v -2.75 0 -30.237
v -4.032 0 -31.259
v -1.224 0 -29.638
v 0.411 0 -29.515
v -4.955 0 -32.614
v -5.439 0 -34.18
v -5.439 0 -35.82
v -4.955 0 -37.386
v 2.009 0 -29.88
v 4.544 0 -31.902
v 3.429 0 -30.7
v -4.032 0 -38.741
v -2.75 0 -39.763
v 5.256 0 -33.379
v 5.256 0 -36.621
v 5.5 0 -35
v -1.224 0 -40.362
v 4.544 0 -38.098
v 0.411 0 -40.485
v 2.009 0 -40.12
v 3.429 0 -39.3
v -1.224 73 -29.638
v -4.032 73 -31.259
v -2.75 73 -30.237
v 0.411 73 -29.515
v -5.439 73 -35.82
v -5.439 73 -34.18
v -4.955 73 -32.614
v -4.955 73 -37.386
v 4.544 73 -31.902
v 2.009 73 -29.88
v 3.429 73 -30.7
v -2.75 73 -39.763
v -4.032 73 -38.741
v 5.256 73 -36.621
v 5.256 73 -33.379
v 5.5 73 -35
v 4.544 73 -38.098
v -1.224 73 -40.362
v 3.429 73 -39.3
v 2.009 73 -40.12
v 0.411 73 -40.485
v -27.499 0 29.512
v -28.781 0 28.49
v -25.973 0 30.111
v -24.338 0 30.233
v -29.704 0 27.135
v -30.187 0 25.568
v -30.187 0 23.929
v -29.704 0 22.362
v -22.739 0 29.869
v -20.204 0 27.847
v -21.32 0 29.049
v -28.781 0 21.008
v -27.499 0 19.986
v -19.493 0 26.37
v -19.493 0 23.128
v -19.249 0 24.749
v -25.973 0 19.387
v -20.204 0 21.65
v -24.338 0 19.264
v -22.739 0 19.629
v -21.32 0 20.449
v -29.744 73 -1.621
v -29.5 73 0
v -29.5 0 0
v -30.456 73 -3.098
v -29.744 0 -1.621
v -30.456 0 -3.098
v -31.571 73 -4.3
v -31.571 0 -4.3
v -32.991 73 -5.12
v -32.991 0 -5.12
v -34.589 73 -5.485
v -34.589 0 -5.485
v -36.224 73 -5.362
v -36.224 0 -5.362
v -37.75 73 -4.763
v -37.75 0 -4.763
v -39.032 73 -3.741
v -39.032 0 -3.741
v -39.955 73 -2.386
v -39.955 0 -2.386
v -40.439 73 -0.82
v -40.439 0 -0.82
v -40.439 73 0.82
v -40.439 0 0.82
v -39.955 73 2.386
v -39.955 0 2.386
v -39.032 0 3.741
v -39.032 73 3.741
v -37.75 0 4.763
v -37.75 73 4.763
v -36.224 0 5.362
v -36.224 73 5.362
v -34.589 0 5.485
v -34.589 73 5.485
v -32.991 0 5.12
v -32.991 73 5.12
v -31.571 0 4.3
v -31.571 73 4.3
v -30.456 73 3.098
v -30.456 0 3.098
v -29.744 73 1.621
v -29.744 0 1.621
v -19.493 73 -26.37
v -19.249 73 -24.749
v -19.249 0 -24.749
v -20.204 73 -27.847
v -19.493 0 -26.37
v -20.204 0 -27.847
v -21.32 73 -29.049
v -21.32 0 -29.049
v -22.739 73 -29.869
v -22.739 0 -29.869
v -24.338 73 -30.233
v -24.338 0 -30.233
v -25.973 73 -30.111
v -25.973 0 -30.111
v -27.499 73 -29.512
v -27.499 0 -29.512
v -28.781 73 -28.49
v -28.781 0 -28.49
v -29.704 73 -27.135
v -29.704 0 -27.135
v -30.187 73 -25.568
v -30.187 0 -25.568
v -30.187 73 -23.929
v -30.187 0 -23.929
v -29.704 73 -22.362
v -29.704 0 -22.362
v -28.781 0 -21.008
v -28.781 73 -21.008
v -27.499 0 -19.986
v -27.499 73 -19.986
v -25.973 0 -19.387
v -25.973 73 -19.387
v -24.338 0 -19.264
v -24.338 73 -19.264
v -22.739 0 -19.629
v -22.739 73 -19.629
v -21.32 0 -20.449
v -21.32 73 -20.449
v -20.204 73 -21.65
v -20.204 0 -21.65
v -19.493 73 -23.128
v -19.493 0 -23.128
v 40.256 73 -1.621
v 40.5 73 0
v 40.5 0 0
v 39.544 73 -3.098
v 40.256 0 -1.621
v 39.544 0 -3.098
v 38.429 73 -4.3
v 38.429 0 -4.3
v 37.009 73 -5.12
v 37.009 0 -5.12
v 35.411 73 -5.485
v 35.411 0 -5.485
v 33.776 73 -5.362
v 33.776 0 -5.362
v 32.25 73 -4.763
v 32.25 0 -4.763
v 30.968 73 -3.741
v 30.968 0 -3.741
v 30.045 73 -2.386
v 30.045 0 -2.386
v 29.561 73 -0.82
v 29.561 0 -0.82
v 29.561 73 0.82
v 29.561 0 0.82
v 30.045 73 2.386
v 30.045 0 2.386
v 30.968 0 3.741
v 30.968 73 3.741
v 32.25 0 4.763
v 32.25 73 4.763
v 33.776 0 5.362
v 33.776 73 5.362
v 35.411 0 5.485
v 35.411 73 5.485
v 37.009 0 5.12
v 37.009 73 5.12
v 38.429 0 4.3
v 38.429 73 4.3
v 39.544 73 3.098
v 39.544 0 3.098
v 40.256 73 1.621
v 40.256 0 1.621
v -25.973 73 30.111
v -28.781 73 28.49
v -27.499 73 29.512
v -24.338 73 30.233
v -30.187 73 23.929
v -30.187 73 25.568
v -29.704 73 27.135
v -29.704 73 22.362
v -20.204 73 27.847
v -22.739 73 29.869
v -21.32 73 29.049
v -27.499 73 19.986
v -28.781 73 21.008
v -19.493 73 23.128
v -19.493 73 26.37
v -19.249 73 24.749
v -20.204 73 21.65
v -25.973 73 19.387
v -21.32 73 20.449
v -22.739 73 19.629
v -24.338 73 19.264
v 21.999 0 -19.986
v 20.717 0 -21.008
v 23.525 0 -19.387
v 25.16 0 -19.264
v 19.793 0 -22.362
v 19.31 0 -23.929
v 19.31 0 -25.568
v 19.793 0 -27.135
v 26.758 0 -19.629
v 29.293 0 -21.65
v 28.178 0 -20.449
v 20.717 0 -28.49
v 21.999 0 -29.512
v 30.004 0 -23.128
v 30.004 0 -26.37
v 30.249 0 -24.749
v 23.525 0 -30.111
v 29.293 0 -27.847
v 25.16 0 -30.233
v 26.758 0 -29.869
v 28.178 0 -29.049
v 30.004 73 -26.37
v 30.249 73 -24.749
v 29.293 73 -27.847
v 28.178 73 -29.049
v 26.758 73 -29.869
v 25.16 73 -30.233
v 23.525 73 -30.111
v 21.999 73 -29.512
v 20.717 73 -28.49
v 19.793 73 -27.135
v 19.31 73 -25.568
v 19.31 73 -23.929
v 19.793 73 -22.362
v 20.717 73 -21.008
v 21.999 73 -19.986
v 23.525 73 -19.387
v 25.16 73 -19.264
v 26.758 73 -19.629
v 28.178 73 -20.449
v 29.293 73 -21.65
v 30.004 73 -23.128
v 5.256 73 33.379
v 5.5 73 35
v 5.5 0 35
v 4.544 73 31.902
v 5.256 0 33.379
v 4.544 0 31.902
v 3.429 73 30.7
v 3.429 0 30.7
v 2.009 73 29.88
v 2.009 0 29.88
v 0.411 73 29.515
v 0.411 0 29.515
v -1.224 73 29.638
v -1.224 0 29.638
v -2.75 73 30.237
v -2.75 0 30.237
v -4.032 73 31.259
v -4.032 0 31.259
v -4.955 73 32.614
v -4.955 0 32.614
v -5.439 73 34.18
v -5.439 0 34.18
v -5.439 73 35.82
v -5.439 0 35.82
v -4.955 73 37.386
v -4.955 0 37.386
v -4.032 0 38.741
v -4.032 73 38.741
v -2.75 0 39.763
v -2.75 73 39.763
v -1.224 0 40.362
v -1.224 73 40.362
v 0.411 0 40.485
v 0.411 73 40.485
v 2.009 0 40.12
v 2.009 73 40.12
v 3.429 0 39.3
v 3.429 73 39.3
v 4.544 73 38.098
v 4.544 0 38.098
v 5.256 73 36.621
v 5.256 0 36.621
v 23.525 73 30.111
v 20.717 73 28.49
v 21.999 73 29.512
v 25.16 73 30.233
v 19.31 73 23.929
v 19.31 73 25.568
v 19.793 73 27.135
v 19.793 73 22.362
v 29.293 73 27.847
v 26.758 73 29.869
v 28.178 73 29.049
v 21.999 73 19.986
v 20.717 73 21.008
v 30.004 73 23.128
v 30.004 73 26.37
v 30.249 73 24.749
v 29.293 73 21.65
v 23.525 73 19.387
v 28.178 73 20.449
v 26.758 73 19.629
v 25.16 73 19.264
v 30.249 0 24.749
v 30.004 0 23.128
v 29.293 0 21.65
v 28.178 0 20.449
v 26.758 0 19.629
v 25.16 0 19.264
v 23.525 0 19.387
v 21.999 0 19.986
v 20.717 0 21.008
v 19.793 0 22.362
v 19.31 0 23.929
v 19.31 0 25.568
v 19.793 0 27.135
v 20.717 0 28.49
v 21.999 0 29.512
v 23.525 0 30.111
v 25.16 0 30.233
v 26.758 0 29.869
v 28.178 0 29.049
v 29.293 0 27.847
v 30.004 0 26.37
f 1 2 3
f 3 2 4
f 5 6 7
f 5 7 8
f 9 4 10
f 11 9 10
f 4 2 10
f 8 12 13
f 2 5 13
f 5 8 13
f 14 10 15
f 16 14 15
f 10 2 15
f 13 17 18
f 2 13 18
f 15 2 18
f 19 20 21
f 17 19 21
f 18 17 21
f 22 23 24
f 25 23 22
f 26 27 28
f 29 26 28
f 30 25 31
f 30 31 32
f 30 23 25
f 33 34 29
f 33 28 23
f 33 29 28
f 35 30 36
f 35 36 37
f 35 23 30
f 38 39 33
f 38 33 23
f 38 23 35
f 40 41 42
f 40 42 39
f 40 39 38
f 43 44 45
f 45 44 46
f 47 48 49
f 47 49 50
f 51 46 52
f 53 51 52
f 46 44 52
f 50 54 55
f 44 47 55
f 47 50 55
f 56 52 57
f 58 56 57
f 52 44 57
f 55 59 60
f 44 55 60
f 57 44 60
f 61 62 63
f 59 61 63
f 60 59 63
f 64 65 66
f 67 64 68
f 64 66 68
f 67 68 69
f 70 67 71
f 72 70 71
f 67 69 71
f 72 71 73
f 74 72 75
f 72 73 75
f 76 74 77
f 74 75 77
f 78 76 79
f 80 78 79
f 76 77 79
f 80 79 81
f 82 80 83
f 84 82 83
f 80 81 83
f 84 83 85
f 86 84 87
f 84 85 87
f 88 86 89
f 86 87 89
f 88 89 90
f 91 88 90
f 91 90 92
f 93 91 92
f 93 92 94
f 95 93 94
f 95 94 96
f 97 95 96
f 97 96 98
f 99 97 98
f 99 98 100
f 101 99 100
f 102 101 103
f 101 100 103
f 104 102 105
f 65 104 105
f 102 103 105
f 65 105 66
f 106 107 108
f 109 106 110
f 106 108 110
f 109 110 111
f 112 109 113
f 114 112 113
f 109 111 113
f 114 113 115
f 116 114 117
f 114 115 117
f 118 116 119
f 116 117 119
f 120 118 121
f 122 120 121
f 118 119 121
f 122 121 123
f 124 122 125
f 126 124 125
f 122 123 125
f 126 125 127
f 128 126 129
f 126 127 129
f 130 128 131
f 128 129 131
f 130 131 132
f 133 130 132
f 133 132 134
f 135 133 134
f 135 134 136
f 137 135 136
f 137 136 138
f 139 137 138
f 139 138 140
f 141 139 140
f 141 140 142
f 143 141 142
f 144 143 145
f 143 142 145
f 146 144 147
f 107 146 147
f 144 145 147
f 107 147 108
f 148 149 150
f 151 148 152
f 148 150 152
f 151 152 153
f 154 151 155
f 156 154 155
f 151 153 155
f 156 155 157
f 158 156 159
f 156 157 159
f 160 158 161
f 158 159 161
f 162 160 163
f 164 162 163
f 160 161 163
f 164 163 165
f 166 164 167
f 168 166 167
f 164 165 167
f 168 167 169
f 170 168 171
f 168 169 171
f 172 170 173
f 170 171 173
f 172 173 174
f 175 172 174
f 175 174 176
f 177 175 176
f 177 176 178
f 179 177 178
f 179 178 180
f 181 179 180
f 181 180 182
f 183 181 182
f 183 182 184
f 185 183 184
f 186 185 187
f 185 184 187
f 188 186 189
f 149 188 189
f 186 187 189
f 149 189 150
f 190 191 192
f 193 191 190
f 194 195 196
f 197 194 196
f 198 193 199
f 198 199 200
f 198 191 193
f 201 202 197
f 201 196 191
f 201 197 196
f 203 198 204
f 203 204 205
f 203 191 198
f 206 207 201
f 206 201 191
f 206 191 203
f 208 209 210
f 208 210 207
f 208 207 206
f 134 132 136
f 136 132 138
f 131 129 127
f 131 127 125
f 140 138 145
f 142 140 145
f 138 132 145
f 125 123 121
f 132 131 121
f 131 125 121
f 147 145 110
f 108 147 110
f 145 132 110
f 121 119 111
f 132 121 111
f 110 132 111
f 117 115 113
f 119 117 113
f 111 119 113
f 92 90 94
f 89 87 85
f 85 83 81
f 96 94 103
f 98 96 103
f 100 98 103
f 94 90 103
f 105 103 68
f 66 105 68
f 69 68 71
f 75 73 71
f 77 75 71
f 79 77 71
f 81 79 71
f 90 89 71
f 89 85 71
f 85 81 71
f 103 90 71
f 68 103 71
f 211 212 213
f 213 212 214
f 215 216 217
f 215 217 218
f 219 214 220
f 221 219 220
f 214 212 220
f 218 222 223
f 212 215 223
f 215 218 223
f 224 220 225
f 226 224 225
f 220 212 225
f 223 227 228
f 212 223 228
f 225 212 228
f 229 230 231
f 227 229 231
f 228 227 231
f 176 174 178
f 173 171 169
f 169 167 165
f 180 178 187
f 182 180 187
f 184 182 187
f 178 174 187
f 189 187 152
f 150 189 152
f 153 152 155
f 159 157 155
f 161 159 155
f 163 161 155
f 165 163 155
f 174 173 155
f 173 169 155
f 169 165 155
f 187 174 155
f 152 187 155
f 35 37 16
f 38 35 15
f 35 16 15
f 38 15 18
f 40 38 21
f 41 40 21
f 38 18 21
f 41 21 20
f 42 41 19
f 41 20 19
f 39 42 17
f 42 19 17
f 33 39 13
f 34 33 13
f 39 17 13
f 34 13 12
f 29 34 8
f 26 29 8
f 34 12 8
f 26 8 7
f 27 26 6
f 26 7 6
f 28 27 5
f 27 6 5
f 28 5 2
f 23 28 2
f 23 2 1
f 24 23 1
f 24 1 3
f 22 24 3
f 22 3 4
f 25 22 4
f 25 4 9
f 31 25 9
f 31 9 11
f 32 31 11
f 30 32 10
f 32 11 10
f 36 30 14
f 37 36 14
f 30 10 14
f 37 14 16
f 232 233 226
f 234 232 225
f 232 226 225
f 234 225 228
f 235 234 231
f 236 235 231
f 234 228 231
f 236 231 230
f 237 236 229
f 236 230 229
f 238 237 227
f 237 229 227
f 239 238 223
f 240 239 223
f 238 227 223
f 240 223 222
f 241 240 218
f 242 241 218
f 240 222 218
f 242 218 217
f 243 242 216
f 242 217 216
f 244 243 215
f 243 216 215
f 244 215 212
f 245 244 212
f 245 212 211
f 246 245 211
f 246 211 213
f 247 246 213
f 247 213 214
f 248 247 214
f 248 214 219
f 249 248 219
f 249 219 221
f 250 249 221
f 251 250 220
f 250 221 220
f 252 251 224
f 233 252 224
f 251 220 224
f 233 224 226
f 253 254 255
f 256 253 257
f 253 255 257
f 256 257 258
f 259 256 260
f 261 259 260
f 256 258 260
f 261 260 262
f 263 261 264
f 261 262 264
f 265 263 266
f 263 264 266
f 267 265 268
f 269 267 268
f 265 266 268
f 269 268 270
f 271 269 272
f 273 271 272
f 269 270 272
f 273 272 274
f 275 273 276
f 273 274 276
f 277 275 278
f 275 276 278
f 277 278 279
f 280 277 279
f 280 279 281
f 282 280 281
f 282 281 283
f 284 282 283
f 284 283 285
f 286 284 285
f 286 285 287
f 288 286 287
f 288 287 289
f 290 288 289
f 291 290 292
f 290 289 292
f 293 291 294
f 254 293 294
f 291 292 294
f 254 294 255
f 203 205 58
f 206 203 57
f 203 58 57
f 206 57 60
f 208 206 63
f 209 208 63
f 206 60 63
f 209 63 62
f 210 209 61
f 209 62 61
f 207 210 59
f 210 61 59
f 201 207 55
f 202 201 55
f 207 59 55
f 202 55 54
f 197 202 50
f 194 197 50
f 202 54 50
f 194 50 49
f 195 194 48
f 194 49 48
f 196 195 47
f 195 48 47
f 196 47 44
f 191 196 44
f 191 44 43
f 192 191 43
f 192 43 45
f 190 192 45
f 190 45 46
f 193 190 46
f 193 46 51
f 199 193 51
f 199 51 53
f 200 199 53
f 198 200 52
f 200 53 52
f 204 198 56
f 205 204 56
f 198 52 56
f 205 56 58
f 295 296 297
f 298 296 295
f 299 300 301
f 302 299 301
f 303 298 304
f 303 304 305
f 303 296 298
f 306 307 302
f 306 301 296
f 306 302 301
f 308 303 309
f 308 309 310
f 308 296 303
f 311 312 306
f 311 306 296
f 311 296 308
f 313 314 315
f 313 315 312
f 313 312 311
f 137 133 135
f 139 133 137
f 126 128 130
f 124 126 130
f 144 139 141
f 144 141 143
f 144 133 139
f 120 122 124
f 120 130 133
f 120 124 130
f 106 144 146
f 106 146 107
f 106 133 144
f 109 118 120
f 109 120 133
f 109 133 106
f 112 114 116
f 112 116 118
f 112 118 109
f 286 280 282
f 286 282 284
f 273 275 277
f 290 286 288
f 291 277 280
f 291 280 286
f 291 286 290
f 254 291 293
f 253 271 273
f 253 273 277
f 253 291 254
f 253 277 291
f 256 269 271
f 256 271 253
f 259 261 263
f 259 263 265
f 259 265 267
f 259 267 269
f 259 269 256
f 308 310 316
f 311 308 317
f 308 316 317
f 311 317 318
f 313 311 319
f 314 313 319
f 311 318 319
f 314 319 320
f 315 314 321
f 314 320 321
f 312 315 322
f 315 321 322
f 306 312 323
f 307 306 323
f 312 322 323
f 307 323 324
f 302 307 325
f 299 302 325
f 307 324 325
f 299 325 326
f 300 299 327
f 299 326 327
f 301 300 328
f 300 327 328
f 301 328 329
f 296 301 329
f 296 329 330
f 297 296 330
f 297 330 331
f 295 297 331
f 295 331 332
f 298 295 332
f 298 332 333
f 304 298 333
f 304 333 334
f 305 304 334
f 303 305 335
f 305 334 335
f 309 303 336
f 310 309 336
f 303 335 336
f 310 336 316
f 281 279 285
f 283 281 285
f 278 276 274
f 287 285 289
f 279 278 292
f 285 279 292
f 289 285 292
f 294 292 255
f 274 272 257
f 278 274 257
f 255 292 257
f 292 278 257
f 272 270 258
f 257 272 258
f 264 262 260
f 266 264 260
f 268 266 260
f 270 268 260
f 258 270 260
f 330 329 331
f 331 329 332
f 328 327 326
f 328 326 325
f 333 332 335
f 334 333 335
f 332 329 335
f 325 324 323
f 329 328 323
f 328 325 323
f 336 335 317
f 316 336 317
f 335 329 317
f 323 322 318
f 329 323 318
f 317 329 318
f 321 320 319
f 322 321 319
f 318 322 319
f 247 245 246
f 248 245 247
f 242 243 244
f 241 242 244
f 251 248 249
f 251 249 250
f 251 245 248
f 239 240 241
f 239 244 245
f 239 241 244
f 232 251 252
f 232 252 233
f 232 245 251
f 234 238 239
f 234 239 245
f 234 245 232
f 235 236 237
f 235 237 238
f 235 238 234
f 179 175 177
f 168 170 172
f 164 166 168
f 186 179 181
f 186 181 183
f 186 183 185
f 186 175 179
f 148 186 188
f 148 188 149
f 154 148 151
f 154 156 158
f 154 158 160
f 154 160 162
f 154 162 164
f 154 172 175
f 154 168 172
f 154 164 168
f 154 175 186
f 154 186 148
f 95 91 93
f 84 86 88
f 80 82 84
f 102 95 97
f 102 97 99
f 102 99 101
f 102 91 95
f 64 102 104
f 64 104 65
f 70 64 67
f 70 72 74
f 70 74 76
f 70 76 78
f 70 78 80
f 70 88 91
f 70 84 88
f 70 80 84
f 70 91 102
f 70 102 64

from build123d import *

# Parameters (mm, degrees)
SKETCH1_R             = 5.5
BOSS_EXTRUDE1_DEPTH   = 73
BOSS_EXTRUDE1_2_DEPTH = 73
BOSS_EXTRUDE1_3_DEPTH = 73
BOSS_EXTRUDE1_4_DEPTH = 73
BOSS_EXTRUDE1_5_DEPTH = 73
BOSS_EXTRUDE1_6_DEPTH = 73
BOSS_EXTRUDE1_7_DEPTH = 73
BOSS_EXTRUDE1_8_DEPTH = 73


with BuildPart() as part:
    # Sketch1 → Boss-Extrude1 (new body)
    with BuildSketch(Plane(origin=(0, 0, 0), x_dir=(1, 0, 0), z_dir=(0, 1, 0))):
        with Locations((-35, 0)):
            Circle(SKETCH1_R)
    extrude(amount=BOSS_EXTRUDE1_DEPTH)


with BuildPart() as body_2:
    # Sketch1 → Boss-Extrude1 2 (new body)
    with BuildSketch(Plane(origin=(0, 0, 0), x_dir=(1, 0, 0), z_dir=(0, 1, 0))):
        with Locations((-24.748737342, 24.748737342)):
            Circle(SKETCH1_R)
    extrude(amount=BOSS_EXTRUDE1_2_DEPTH)


with BuildPart() as body_3:
    # Sketch1 → Boss-Extrude1 3 (new body)
    with BuildSketch(Plane(origin=(0, 0, 0), x_dir=(1, 0, 0), z_dir=(0, 1, 0))):
        with Locations((0, 35)):
            Circle(SKETCH1_R)
    extrude(amount=BOSS_EXTRUDE1_3_DEPTH)


with BuildPart() as body_4:
    # Sketch1 → Boss-Extrude1 4 (new body)
    with BuildSketch(Plane(origin=(0, 0, 0), x_dir=(1, 0, 0), z_dir=(0, 1, 0))):
        with Locations((24.748737342, 24.748737342)):
            Circle(SKETCH1_R)
    extrude(amount=BOSS_EXTRUDE1_4_DEPTH)


with BuildPart() as body_5:
    # Sketch1 → Boss-Extrude1 5 (new body)
    with BuildSketch(Plane(origin=(0, 0, 0), x_dir=(1, 0, 0), z_dir=(0, 1, 0))):
        with Locations((35, 0)):
            Circle(SKETCH1_R)
    extrude(amount=BOSS_EXTRUDE1_5_DEPTH)


with BuildPart() as body_6:
    # Sketch1 → Boss-Extrude1 6 (new body)
    with BuildSketch(Plane(origin=(0, 0, 0), x_dir=(1, 0, 0), z_dir=(0, 1, 0))):
        with Locations((24.748737342, -24.748737342)):
            Circle(SKETCH1_R)
    extrude(amount=BOSS_EXTRUDE1_6_DEPTH)


with BuildPart() as body_7:
    # Sketch1 → Boss-Extrude1 7 (new body)
    with BuildSketch(Plane(origin=(0, 0, 0), x_dir=(1, 0, 0), z_dir=(0, 1, 0))):
        with Locations((0, -35)):
            Circle(SKETCH1_R)
    extrude(amount=BOSS_EXTRUDE1_7_DEPTH)


with BuildPart() as body_8:
    # Sketch1 → Boss-Extrude1 8 (new body)
    with BuildSketch(Plane(origin=(0, 0, 0), x_dir=(1, 0, 0), z_dir=(0, 1, 0))):
        with Locations((-24.748737342, -24.748737342)):
            Circle(SKETCH1_R)
    extrude(amount=BOSS_EXTRUDE1_8_DEPTH)


solid = Compound([part.part, body_2.part, body_3.part, body_4.part, body_5.part, body_6.part, body_7.part, body_8.part])
